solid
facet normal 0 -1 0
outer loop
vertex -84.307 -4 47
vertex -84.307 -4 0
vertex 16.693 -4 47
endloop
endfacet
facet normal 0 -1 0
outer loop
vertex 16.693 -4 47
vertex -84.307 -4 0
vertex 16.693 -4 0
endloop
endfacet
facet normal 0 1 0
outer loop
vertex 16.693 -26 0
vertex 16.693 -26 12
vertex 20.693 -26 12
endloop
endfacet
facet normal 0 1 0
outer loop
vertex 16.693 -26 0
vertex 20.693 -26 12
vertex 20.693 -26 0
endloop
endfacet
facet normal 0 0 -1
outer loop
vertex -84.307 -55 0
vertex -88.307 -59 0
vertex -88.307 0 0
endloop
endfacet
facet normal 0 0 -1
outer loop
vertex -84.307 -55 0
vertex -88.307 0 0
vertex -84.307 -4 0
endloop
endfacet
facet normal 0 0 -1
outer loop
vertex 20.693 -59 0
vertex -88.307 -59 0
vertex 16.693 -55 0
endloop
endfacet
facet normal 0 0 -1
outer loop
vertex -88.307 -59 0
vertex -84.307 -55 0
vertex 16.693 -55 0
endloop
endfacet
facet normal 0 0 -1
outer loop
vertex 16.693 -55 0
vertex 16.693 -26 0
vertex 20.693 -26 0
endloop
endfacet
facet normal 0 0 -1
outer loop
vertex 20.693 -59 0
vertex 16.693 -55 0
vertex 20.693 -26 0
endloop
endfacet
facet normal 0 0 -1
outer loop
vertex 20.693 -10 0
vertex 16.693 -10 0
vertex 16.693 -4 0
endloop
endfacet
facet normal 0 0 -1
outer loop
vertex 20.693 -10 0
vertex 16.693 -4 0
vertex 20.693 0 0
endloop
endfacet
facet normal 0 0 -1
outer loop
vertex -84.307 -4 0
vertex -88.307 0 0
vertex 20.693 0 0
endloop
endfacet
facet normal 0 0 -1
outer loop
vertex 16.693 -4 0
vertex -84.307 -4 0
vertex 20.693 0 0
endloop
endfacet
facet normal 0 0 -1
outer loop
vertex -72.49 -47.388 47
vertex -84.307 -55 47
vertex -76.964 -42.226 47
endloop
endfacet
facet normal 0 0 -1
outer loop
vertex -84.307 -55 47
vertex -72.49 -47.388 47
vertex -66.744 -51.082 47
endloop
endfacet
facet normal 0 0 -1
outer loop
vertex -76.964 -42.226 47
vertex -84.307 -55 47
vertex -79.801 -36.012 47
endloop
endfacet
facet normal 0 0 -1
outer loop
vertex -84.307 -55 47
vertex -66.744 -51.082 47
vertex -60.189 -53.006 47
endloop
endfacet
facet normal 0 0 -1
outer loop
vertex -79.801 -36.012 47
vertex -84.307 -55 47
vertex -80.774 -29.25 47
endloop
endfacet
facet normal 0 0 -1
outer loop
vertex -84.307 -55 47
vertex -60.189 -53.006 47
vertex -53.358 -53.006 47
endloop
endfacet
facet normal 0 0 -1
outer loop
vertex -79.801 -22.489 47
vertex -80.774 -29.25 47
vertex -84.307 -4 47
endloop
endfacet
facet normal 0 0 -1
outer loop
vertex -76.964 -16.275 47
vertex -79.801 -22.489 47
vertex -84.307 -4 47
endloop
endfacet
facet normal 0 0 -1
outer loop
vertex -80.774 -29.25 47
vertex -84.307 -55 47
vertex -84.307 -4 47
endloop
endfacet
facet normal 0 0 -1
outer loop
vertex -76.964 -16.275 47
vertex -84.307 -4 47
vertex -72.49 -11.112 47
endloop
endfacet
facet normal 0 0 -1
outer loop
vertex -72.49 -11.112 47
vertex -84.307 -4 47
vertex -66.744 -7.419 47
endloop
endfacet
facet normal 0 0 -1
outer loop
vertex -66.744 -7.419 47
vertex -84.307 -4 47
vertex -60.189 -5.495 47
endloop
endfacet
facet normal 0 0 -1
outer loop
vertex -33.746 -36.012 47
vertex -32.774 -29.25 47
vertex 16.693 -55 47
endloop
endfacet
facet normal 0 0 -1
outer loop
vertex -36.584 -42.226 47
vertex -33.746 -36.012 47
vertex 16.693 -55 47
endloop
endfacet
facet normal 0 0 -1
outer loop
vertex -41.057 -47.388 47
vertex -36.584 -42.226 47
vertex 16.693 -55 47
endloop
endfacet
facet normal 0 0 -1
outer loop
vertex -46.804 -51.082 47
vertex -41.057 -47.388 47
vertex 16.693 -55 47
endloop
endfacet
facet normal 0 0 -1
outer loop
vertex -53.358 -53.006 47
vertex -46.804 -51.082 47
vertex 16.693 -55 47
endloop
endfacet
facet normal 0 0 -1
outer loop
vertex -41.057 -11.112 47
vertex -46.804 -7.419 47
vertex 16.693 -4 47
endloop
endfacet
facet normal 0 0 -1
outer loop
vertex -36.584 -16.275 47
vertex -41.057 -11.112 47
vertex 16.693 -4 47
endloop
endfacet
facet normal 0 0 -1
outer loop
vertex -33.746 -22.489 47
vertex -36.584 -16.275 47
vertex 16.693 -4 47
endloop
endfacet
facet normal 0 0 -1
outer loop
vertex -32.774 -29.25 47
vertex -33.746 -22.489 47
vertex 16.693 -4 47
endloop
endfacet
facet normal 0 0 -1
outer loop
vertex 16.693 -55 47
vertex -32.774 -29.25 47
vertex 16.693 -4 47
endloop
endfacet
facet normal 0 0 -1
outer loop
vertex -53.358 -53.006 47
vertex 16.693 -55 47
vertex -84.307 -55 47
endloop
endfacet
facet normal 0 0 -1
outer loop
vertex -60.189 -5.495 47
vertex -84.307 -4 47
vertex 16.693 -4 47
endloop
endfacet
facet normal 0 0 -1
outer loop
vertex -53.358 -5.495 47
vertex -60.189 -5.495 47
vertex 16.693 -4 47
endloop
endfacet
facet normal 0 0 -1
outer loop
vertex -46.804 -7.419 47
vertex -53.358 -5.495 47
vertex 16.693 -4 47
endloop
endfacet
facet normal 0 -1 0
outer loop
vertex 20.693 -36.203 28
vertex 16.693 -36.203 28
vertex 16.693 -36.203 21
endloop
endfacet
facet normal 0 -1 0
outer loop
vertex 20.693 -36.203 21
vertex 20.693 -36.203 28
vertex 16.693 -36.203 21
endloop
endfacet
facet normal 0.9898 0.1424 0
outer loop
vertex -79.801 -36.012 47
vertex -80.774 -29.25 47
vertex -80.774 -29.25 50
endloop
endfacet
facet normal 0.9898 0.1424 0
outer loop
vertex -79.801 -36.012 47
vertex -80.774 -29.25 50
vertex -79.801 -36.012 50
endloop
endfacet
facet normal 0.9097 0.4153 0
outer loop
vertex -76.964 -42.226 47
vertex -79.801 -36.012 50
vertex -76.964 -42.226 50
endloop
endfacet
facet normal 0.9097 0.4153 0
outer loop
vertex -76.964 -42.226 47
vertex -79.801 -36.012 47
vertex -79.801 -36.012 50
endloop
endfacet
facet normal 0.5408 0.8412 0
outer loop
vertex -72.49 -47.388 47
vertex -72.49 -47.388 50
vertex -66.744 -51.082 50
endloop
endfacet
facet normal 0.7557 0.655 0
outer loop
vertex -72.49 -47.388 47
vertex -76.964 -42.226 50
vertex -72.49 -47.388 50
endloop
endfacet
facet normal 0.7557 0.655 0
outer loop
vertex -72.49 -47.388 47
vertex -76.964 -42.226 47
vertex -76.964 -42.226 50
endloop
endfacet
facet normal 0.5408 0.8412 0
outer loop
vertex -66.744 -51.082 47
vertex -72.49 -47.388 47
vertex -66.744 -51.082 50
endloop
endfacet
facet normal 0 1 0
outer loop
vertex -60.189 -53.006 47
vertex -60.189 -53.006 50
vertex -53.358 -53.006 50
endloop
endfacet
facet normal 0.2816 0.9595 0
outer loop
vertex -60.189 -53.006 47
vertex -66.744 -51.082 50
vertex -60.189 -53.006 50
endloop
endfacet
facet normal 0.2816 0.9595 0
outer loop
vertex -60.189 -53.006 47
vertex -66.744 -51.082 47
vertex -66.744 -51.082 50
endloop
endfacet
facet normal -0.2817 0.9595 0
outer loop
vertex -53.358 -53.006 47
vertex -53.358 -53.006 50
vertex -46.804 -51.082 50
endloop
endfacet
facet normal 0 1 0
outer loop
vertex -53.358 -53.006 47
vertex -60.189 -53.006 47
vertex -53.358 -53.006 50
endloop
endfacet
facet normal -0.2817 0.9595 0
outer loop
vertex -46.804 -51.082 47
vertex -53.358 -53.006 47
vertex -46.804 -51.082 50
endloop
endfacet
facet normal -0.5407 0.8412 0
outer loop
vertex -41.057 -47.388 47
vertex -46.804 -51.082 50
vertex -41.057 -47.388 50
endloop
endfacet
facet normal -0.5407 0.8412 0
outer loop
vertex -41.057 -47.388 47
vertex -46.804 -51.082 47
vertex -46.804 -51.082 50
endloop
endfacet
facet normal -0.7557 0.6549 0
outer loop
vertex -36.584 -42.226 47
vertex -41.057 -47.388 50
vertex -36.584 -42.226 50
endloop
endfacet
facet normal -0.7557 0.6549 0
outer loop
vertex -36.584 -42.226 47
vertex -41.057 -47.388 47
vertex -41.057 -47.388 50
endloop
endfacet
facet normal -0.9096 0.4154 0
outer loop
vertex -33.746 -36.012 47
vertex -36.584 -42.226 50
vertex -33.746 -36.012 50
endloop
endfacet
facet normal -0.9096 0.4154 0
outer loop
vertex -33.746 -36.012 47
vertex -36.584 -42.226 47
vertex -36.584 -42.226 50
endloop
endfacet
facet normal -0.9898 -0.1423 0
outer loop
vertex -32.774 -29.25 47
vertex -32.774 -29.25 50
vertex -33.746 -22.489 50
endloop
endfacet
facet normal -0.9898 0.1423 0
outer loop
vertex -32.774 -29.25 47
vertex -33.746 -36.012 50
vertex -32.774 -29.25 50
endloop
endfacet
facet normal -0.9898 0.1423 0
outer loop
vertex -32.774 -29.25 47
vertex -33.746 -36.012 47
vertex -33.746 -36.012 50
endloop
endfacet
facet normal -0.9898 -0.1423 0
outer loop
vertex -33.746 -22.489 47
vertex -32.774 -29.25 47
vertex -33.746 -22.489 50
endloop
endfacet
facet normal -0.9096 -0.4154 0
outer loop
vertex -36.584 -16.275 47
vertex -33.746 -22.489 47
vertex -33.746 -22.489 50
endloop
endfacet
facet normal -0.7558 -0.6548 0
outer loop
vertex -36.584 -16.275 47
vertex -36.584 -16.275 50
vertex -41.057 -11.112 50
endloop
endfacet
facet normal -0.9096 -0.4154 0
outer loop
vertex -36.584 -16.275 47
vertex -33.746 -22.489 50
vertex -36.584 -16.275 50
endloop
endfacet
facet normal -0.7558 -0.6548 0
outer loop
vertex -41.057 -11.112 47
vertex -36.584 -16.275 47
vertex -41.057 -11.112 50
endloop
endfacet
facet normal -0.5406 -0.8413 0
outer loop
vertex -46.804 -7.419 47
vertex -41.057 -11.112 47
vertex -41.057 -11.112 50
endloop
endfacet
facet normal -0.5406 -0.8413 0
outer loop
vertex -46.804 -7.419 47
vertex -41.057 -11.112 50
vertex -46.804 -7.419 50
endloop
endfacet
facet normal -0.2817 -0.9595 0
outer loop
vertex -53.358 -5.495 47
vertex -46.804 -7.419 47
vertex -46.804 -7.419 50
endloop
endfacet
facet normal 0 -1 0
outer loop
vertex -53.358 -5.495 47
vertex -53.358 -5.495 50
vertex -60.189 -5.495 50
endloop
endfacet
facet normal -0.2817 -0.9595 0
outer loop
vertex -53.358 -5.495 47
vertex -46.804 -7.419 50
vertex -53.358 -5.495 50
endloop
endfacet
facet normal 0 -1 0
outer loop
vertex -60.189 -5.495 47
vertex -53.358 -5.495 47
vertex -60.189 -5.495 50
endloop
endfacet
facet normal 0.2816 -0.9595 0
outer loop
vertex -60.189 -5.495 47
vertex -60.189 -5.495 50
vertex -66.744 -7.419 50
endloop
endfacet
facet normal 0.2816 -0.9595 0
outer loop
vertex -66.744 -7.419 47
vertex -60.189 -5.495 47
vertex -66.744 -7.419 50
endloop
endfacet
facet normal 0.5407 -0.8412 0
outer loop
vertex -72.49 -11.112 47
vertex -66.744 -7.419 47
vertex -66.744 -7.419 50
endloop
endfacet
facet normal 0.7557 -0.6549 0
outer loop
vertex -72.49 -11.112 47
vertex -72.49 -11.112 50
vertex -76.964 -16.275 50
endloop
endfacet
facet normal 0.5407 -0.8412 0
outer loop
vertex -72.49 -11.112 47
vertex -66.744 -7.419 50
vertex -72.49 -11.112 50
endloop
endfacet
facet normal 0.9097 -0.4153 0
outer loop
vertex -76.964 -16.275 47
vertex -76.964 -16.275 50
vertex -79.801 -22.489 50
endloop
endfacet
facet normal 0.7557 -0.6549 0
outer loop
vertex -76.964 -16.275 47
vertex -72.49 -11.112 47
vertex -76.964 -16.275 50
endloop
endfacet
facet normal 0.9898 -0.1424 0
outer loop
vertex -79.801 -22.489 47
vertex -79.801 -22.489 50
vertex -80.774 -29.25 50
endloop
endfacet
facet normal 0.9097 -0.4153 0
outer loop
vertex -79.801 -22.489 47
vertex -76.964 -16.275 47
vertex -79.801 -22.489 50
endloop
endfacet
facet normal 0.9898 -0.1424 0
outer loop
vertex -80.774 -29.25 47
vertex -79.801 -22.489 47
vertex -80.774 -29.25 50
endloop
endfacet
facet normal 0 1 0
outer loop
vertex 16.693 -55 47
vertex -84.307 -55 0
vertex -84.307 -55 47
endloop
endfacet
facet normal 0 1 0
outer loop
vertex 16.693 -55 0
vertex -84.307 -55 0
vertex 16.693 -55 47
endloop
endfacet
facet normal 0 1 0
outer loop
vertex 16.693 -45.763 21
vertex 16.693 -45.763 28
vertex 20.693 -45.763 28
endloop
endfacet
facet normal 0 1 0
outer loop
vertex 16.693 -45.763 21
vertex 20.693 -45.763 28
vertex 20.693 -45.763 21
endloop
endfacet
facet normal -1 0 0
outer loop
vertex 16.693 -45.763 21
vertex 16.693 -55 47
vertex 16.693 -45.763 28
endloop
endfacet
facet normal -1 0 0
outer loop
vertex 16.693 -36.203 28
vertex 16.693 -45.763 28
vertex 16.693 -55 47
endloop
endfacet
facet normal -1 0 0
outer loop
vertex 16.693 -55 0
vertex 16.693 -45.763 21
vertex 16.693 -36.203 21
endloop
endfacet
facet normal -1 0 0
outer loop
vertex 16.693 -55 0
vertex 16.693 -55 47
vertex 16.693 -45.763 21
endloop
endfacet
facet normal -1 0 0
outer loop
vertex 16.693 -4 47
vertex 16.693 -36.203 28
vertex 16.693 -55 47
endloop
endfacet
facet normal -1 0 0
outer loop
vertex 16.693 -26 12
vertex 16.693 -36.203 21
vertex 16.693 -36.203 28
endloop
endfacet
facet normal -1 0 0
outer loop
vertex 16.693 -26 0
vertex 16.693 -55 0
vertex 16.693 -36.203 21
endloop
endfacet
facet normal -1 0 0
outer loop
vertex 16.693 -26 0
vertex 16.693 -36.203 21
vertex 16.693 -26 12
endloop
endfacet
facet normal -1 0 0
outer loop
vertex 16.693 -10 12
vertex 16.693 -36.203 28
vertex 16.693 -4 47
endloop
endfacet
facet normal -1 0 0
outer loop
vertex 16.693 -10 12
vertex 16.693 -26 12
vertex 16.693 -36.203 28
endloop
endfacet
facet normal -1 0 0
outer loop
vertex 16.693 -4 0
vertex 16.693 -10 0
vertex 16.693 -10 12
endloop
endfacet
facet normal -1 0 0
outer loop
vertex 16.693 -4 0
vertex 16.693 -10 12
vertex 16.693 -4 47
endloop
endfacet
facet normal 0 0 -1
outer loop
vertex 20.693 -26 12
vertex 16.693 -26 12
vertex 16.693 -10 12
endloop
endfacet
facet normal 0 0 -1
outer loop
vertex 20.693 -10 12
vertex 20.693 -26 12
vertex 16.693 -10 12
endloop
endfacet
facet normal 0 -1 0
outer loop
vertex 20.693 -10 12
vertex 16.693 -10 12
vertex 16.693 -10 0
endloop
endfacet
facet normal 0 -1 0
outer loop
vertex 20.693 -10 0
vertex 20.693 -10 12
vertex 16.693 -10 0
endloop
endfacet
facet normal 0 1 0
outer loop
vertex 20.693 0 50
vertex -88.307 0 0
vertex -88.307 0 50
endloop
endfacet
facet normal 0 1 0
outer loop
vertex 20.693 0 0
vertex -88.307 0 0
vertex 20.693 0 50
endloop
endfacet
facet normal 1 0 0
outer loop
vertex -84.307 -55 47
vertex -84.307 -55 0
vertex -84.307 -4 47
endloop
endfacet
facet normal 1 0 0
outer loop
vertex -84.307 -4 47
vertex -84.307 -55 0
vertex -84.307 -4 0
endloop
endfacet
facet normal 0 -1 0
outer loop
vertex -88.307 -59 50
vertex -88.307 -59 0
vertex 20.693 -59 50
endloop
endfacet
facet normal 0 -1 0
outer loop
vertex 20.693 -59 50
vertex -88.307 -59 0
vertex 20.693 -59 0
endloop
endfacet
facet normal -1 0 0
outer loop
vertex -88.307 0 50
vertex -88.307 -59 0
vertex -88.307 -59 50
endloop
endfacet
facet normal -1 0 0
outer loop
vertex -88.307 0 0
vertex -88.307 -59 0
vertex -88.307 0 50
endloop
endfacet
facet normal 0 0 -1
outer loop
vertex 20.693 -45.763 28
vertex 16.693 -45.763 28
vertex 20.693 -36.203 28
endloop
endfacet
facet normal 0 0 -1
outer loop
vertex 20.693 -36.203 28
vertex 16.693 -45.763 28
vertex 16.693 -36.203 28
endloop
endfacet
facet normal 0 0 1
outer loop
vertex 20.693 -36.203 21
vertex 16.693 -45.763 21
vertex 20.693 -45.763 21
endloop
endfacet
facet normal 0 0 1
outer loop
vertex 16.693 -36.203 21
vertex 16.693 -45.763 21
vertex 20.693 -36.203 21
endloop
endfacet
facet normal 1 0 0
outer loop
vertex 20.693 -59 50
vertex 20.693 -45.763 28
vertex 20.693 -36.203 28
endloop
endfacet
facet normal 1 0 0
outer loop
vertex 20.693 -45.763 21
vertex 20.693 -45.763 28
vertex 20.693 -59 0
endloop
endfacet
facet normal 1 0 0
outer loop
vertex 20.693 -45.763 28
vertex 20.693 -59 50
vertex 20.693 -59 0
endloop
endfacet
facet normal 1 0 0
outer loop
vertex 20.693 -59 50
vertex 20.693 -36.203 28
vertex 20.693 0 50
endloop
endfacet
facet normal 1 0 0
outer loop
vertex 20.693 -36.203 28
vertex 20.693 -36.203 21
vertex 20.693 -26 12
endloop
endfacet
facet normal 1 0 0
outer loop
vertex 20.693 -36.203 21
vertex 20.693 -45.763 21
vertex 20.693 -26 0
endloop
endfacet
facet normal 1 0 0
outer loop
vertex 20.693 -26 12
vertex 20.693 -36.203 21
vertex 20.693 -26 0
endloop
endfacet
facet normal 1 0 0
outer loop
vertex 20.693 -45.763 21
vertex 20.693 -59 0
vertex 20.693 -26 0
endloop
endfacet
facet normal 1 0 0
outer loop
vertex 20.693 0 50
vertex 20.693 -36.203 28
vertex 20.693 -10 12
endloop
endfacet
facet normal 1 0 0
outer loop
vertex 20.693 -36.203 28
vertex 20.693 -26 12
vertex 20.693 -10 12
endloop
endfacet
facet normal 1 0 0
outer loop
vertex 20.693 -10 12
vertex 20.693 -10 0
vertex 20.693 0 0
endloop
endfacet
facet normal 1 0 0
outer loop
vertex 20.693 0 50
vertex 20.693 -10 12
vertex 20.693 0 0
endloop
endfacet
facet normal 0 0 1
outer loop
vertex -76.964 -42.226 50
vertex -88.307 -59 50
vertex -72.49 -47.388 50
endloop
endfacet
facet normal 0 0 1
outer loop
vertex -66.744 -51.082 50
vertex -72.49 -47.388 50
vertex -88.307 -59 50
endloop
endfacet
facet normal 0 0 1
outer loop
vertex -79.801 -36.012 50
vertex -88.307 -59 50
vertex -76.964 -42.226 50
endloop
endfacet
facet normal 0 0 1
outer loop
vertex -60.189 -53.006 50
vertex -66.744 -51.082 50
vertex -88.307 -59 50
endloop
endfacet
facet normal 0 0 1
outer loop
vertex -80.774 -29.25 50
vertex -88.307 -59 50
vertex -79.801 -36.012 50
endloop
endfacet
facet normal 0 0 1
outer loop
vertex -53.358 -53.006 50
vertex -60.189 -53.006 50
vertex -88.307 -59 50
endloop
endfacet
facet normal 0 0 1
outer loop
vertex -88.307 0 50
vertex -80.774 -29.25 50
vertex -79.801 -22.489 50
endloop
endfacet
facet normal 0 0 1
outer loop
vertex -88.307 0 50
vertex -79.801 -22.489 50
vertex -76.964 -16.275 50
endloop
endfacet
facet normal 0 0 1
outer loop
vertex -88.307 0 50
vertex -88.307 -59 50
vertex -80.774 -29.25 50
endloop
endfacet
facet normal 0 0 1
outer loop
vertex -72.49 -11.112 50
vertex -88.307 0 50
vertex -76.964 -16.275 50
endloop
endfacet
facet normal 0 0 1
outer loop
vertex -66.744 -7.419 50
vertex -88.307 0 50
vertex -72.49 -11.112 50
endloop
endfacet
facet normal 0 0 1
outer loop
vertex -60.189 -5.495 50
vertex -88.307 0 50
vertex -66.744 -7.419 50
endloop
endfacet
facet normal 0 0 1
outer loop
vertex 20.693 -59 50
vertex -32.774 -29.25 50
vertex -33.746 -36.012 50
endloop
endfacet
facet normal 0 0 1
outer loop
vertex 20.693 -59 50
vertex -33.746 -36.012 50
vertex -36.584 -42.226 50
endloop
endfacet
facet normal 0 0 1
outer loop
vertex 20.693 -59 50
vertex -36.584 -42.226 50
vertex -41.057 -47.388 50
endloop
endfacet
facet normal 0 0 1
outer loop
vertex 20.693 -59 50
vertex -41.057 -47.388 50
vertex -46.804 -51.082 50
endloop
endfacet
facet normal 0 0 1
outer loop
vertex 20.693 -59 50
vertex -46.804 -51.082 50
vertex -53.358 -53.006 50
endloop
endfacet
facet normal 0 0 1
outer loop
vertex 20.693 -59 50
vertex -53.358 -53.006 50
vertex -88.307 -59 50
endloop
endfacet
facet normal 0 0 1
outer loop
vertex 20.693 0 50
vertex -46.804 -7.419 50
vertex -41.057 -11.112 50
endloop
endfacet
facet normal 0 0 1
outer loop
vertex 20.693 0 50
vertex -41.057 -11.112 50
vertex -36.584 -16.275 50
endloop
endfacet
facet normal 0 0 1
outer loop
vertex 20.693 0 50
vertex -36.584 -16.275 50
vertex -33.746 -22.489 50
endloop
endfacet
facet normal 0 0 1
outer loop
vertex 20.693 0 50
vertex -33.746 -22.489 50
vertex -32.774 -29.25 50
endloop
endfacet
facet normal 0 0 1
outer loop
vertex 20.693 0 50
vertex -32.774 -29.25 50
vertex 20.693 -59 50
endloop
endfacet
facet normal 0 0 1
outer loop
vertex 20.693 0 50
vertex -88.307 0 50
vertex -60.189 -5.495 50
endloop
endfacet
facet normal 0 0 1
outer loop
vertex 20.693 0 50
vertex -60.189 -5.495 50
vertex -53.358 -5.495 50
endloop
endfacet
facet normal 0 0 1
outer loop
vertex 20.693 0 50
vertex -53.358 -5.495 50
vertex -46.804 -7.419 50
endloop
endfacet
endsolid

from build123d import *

# Parameters (mm, degrees)
ESQUISSE1_W                  = 109
ESQUISSE1_H                  = 59
BOSS_EXTRU_1_DEPTH           = 50
ESQUISSE2_W                  = 101
ESQUISSE2_H                  = 51
ENL_V_MAT_EXTRU_1_DEPTH      = 47
ENL_V_MAT_EXTRU_2_DEPTH      = 118.384292451
ENL_V_MAT_EXTRU_2_DEPTH_BACK = 21
ESQUISSE3_W                  = 7
ESQUISSE3_H                  = 9.559529104
ESQUISSE3_W_2                = 12
ESQUISSE3_H_2                = 16
ESQUISSE4_R                  = 24
ENL_V_MAT_EXTRU_3_DEPTH      = 73


with BuildPart() as part:
    # Esquisse1 → Boss.-Extru.1 (new body)
    with BuildSketch(Plane.XY):
        with Locations((-33.806693485, -29.5)):
            Rectangle(ESQUISSE1_W, ESQUISSE1_H)
    extrude(amount=BOSS_EXTRU_1_DEPTH)

    # Esquisse2 → Enlèv. mat.-Extru.1 (cut)
    with BuildSketch(Plane.XY):
        with Locations((-33.806693485, -29.5)):
            Rectangle(ESQUISSE2_W, ESQUISSE2_H)
    extrude(amount=ENL_V_MAT_EXTRU_1_DEPTH, mode=Mode.SUBTRACT)

    # Esquisse3 → Enlèv. mat.-Extru.2 (cut, two sides: drawn at the far end of the back side and taken through both)
    with BuildSketch(Plane(origin=(0, 0, 0), x_dir=(0, 0, -1), z_dir=(1, 0, 0)).offset(-ENL_V_MAT_EXTRU_2_DEPTH_BACK)):
        with Locations((-24.5, -40.983092888)):
            Rectangle(ESQUISSE3_W, ESQUISSE3_H)
        with Locations((-6, -18)):
            Rectangle(ESQUISSE3_W_2, ESQUISSE3_H_2)
    extrude(amount=ENL_V_MAT_EXTRU_2_DEPTH + ENL_V_MAT_EXTRU_2_DEPTH_BACK, mode=Mode.SUBTRACT)

    # Esquisse4 → Enlèv. mat.-Extru.3 (cut)
    with BuildSketch(Plane.XY):
        with Locations(Location((-56.773597779, -29.250359736, 0), (0, 0, 180))):
            Circle(ESQUISSE4_R)
    extrude(amount=ENL_V_MAT_EXTRU_3_DEPTH, mode=Mode.SUBTRACT)


solid = part.part
